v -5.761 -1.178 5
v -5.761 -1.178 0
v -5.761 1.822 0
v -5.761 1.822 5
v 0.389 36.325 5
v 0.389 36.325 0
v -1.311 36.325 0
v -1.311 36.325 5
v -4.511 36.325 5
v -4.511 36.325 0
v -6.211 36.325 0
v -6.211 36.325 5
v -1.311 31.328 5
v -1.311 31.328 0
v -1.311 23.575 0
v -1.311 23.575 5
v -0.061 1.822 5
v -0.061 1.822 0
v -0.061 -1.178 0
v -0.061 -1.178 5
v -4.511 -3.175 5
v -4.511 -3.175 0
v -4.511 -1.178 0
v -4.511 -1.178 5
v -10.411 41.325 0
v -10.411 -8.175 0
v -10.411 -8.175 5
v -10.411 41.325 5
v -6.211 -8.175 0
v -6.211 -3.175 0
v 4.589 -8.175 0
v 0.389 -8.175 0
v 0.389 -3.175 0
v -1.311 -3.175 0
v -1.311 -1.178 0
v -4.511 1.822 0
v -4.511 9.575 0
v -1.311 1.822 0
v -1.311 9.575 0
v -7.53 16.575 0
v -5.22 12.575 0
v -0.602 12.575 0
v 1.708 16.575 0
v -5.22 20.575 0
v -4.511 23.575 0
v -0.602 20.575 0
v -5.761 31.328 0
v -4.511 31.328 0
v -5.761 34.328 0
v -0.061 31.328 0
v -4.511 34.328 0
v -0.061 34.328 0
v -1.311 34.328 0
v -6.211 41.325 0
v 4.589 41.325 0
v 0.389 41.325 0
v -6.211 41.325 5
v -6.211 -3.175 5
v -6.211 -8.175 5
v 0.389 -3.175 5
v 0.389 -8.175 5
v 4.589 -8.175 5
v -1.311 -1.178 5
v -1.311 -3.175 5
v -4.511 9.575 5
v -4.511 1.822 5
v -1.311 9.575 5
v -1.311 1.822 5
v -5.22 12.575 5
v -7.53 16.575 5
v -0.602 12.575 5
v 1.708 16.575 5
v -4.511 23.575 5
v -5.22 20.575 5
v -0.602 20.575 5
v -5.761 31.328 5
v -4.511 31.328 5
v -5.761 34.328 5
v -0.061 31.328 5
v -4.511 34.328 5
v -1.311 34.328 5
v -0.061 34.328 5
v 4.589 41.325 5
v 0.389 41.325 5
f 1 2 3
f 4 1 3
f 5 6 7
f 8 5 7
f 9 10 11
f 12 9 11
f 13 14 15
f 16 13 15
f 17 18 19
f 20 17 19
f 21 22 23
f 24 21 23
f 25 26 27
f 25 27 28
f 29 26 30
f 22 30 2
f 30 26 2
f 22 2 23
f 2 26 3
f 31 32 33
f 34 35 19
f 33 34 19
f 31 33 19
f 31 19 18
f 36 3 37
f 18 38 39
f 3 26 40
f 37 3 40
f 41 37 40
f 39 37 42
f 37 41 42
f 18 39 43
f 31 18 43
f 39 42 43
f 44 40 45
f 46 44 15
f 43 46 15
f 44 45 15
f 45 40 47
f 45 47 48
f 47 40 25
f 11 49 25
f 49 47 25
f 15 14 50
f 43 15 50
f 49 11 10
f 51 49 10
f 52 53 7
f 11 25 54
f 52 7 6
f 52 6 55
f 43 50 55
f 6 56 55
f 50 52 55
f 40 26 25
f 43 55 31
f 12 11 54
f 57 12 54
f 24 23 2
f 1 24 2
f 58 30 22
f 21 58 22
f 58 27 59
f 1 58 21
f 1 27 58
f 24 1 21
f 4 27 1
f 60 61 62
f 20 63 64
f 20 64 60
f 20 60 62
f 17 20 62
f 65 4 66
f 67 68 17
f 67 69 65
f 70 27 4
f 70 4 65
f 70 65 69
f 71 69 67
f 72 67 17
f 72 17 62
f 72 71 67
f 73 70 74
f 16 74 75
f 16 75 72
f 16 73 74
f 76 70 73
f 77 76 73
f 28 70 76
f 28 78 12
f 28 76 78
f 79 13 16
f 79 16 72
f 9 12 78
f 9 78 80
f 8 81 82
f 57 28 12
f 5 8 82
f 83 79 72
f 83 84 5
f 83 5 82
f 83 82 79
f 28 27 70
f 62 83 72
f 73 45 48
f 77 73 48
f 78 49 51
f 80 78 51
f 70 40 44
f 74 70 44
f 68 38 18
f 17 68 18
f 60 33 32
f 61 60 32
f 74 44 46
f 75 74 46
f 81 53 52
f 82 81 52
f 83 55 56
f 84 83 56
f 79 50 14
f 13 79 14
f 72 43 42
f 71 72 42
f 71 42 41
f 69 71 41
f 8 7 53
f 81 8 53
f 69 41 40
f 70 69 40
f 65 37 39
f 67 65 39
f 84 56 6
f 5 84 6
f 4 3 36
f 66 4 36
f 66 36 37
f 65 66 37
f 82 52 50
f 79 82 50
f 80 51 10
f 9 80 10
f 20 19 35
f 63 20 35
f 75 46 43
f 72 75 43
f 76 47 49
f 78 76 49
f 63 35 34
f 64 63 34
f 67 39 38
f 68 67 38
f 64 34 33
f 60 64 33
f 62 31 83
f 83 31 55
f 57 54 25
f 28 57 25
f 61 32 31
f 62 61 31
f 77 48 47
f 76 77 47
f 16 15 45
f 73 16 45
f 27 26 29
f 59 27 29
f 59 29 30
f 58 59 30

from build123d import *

# Parameters (mm, degrees)
BOSS_EXTRU_1_DEPTH      = 5
ESQUISSE2_W             = 11.095305832
ESQUISSE2_H             = 52.844950213
ESQUISSE2_W_2           = 7.610241821
ESQUISSE2_H_2           = 54.125177809
ENL_V_MAT_EXTRU_1_DEPTH = 10
ENL_V_MAT_EXTRU_2_DEPTH = 10


with BuildPart() as part:
    # Esquisse1 → Boss.-Extru.1 (new body)
    with BuildSketch(Plane.XY):
        Polygon((-12.911051911, 41.325067336), (-12.911051911, -8.174932664), (-6.211051911, -8.174932664), (-6.211051911, -3.174932664), (-4.511051911, -3.174932664), (-4.511051911, -1.178236629), (-5.761051911, -1.178236629), (-5.761051911, 1.821763371), (-4.511051911, 1.821763371), (-4.511051911, 9.575067336), (-1.311051911, 9.575067336), (-1.311051911, 1.821763371), (-0.061051911, 1.821763371), (-0.061051911, -1.178236629), (-1.311051911, -1.178236629), (-1.311051911, -3.174932664), (0.388948089, -3.174932664), (0.388948089, -8.174932664), (7.088948089, -8.174932664), (7.088948089, 41.325067336), (0.388948089, 41.325067336), (0.388948089, 36.325067336), (-1.311051911, 36.325067336), (-1.311051911, 34.328371301), (-0.061051911, 34.328371301), (-0.061051911, 31.328371301), (-1.311051911, 31.328371301), (-1.311051911, 23.575067336), (-4.511051911, 23.575067336), (-4.511051911, 31.328371301), (-5.761051911, 31.328371301), (-5.761051911, 34.328371301), (-4.511051911, 34.328371301), (-4.511051911, 36.325067336), (-6.211051911, 36.325067336), (-6.211051911, 41.325067336), align=None)
    extrude(amount=BOSS_EXTRU_1_DEPTH)

    # Esquisse2 → Enlèv. mat.-Extru.1 (cut)
    with BuildSketch(Plane(origin=(0, 0, 0), x_dir=(-1, 0, 0), z_dir=(0, 0, -1))):
        with Locations((-10.136601005, 16.610629213)):
            Rectangle(ESQUISSE2_W, ESQUISSE2_H)
        with Locations((14.216172822, 16.610629214)):
            Rectangle(ESQUISSE2_W_2, ESQUISSE2_H_2)
    extrude(amount=-ENL_V_MAT_EXTRU_1_DEPTH, mode=Mode.SUBTRACT)

    # Esquisse3 → Enlèv. mat.-Extru.2 (cut)
    with BuildSketch(Plane(origin=(0, 0, 0), x_dir=(-1, 0, 0), z_dir=(0, 0, -1))):
        Polygon((5.220452988, 12.575067336), (7.529854064, 16.575067336), (5.220452988, 20.575067336), (0.601650834, 20.575067336), (-1.707750243, 16.575067336), (0.601650834, 12.575067336), align=None)
    extrude(amount=-ENL_V_MAT_EXTRU_2_DEPTH, mode=Mode.SUBTRACT)


solid = part.part
